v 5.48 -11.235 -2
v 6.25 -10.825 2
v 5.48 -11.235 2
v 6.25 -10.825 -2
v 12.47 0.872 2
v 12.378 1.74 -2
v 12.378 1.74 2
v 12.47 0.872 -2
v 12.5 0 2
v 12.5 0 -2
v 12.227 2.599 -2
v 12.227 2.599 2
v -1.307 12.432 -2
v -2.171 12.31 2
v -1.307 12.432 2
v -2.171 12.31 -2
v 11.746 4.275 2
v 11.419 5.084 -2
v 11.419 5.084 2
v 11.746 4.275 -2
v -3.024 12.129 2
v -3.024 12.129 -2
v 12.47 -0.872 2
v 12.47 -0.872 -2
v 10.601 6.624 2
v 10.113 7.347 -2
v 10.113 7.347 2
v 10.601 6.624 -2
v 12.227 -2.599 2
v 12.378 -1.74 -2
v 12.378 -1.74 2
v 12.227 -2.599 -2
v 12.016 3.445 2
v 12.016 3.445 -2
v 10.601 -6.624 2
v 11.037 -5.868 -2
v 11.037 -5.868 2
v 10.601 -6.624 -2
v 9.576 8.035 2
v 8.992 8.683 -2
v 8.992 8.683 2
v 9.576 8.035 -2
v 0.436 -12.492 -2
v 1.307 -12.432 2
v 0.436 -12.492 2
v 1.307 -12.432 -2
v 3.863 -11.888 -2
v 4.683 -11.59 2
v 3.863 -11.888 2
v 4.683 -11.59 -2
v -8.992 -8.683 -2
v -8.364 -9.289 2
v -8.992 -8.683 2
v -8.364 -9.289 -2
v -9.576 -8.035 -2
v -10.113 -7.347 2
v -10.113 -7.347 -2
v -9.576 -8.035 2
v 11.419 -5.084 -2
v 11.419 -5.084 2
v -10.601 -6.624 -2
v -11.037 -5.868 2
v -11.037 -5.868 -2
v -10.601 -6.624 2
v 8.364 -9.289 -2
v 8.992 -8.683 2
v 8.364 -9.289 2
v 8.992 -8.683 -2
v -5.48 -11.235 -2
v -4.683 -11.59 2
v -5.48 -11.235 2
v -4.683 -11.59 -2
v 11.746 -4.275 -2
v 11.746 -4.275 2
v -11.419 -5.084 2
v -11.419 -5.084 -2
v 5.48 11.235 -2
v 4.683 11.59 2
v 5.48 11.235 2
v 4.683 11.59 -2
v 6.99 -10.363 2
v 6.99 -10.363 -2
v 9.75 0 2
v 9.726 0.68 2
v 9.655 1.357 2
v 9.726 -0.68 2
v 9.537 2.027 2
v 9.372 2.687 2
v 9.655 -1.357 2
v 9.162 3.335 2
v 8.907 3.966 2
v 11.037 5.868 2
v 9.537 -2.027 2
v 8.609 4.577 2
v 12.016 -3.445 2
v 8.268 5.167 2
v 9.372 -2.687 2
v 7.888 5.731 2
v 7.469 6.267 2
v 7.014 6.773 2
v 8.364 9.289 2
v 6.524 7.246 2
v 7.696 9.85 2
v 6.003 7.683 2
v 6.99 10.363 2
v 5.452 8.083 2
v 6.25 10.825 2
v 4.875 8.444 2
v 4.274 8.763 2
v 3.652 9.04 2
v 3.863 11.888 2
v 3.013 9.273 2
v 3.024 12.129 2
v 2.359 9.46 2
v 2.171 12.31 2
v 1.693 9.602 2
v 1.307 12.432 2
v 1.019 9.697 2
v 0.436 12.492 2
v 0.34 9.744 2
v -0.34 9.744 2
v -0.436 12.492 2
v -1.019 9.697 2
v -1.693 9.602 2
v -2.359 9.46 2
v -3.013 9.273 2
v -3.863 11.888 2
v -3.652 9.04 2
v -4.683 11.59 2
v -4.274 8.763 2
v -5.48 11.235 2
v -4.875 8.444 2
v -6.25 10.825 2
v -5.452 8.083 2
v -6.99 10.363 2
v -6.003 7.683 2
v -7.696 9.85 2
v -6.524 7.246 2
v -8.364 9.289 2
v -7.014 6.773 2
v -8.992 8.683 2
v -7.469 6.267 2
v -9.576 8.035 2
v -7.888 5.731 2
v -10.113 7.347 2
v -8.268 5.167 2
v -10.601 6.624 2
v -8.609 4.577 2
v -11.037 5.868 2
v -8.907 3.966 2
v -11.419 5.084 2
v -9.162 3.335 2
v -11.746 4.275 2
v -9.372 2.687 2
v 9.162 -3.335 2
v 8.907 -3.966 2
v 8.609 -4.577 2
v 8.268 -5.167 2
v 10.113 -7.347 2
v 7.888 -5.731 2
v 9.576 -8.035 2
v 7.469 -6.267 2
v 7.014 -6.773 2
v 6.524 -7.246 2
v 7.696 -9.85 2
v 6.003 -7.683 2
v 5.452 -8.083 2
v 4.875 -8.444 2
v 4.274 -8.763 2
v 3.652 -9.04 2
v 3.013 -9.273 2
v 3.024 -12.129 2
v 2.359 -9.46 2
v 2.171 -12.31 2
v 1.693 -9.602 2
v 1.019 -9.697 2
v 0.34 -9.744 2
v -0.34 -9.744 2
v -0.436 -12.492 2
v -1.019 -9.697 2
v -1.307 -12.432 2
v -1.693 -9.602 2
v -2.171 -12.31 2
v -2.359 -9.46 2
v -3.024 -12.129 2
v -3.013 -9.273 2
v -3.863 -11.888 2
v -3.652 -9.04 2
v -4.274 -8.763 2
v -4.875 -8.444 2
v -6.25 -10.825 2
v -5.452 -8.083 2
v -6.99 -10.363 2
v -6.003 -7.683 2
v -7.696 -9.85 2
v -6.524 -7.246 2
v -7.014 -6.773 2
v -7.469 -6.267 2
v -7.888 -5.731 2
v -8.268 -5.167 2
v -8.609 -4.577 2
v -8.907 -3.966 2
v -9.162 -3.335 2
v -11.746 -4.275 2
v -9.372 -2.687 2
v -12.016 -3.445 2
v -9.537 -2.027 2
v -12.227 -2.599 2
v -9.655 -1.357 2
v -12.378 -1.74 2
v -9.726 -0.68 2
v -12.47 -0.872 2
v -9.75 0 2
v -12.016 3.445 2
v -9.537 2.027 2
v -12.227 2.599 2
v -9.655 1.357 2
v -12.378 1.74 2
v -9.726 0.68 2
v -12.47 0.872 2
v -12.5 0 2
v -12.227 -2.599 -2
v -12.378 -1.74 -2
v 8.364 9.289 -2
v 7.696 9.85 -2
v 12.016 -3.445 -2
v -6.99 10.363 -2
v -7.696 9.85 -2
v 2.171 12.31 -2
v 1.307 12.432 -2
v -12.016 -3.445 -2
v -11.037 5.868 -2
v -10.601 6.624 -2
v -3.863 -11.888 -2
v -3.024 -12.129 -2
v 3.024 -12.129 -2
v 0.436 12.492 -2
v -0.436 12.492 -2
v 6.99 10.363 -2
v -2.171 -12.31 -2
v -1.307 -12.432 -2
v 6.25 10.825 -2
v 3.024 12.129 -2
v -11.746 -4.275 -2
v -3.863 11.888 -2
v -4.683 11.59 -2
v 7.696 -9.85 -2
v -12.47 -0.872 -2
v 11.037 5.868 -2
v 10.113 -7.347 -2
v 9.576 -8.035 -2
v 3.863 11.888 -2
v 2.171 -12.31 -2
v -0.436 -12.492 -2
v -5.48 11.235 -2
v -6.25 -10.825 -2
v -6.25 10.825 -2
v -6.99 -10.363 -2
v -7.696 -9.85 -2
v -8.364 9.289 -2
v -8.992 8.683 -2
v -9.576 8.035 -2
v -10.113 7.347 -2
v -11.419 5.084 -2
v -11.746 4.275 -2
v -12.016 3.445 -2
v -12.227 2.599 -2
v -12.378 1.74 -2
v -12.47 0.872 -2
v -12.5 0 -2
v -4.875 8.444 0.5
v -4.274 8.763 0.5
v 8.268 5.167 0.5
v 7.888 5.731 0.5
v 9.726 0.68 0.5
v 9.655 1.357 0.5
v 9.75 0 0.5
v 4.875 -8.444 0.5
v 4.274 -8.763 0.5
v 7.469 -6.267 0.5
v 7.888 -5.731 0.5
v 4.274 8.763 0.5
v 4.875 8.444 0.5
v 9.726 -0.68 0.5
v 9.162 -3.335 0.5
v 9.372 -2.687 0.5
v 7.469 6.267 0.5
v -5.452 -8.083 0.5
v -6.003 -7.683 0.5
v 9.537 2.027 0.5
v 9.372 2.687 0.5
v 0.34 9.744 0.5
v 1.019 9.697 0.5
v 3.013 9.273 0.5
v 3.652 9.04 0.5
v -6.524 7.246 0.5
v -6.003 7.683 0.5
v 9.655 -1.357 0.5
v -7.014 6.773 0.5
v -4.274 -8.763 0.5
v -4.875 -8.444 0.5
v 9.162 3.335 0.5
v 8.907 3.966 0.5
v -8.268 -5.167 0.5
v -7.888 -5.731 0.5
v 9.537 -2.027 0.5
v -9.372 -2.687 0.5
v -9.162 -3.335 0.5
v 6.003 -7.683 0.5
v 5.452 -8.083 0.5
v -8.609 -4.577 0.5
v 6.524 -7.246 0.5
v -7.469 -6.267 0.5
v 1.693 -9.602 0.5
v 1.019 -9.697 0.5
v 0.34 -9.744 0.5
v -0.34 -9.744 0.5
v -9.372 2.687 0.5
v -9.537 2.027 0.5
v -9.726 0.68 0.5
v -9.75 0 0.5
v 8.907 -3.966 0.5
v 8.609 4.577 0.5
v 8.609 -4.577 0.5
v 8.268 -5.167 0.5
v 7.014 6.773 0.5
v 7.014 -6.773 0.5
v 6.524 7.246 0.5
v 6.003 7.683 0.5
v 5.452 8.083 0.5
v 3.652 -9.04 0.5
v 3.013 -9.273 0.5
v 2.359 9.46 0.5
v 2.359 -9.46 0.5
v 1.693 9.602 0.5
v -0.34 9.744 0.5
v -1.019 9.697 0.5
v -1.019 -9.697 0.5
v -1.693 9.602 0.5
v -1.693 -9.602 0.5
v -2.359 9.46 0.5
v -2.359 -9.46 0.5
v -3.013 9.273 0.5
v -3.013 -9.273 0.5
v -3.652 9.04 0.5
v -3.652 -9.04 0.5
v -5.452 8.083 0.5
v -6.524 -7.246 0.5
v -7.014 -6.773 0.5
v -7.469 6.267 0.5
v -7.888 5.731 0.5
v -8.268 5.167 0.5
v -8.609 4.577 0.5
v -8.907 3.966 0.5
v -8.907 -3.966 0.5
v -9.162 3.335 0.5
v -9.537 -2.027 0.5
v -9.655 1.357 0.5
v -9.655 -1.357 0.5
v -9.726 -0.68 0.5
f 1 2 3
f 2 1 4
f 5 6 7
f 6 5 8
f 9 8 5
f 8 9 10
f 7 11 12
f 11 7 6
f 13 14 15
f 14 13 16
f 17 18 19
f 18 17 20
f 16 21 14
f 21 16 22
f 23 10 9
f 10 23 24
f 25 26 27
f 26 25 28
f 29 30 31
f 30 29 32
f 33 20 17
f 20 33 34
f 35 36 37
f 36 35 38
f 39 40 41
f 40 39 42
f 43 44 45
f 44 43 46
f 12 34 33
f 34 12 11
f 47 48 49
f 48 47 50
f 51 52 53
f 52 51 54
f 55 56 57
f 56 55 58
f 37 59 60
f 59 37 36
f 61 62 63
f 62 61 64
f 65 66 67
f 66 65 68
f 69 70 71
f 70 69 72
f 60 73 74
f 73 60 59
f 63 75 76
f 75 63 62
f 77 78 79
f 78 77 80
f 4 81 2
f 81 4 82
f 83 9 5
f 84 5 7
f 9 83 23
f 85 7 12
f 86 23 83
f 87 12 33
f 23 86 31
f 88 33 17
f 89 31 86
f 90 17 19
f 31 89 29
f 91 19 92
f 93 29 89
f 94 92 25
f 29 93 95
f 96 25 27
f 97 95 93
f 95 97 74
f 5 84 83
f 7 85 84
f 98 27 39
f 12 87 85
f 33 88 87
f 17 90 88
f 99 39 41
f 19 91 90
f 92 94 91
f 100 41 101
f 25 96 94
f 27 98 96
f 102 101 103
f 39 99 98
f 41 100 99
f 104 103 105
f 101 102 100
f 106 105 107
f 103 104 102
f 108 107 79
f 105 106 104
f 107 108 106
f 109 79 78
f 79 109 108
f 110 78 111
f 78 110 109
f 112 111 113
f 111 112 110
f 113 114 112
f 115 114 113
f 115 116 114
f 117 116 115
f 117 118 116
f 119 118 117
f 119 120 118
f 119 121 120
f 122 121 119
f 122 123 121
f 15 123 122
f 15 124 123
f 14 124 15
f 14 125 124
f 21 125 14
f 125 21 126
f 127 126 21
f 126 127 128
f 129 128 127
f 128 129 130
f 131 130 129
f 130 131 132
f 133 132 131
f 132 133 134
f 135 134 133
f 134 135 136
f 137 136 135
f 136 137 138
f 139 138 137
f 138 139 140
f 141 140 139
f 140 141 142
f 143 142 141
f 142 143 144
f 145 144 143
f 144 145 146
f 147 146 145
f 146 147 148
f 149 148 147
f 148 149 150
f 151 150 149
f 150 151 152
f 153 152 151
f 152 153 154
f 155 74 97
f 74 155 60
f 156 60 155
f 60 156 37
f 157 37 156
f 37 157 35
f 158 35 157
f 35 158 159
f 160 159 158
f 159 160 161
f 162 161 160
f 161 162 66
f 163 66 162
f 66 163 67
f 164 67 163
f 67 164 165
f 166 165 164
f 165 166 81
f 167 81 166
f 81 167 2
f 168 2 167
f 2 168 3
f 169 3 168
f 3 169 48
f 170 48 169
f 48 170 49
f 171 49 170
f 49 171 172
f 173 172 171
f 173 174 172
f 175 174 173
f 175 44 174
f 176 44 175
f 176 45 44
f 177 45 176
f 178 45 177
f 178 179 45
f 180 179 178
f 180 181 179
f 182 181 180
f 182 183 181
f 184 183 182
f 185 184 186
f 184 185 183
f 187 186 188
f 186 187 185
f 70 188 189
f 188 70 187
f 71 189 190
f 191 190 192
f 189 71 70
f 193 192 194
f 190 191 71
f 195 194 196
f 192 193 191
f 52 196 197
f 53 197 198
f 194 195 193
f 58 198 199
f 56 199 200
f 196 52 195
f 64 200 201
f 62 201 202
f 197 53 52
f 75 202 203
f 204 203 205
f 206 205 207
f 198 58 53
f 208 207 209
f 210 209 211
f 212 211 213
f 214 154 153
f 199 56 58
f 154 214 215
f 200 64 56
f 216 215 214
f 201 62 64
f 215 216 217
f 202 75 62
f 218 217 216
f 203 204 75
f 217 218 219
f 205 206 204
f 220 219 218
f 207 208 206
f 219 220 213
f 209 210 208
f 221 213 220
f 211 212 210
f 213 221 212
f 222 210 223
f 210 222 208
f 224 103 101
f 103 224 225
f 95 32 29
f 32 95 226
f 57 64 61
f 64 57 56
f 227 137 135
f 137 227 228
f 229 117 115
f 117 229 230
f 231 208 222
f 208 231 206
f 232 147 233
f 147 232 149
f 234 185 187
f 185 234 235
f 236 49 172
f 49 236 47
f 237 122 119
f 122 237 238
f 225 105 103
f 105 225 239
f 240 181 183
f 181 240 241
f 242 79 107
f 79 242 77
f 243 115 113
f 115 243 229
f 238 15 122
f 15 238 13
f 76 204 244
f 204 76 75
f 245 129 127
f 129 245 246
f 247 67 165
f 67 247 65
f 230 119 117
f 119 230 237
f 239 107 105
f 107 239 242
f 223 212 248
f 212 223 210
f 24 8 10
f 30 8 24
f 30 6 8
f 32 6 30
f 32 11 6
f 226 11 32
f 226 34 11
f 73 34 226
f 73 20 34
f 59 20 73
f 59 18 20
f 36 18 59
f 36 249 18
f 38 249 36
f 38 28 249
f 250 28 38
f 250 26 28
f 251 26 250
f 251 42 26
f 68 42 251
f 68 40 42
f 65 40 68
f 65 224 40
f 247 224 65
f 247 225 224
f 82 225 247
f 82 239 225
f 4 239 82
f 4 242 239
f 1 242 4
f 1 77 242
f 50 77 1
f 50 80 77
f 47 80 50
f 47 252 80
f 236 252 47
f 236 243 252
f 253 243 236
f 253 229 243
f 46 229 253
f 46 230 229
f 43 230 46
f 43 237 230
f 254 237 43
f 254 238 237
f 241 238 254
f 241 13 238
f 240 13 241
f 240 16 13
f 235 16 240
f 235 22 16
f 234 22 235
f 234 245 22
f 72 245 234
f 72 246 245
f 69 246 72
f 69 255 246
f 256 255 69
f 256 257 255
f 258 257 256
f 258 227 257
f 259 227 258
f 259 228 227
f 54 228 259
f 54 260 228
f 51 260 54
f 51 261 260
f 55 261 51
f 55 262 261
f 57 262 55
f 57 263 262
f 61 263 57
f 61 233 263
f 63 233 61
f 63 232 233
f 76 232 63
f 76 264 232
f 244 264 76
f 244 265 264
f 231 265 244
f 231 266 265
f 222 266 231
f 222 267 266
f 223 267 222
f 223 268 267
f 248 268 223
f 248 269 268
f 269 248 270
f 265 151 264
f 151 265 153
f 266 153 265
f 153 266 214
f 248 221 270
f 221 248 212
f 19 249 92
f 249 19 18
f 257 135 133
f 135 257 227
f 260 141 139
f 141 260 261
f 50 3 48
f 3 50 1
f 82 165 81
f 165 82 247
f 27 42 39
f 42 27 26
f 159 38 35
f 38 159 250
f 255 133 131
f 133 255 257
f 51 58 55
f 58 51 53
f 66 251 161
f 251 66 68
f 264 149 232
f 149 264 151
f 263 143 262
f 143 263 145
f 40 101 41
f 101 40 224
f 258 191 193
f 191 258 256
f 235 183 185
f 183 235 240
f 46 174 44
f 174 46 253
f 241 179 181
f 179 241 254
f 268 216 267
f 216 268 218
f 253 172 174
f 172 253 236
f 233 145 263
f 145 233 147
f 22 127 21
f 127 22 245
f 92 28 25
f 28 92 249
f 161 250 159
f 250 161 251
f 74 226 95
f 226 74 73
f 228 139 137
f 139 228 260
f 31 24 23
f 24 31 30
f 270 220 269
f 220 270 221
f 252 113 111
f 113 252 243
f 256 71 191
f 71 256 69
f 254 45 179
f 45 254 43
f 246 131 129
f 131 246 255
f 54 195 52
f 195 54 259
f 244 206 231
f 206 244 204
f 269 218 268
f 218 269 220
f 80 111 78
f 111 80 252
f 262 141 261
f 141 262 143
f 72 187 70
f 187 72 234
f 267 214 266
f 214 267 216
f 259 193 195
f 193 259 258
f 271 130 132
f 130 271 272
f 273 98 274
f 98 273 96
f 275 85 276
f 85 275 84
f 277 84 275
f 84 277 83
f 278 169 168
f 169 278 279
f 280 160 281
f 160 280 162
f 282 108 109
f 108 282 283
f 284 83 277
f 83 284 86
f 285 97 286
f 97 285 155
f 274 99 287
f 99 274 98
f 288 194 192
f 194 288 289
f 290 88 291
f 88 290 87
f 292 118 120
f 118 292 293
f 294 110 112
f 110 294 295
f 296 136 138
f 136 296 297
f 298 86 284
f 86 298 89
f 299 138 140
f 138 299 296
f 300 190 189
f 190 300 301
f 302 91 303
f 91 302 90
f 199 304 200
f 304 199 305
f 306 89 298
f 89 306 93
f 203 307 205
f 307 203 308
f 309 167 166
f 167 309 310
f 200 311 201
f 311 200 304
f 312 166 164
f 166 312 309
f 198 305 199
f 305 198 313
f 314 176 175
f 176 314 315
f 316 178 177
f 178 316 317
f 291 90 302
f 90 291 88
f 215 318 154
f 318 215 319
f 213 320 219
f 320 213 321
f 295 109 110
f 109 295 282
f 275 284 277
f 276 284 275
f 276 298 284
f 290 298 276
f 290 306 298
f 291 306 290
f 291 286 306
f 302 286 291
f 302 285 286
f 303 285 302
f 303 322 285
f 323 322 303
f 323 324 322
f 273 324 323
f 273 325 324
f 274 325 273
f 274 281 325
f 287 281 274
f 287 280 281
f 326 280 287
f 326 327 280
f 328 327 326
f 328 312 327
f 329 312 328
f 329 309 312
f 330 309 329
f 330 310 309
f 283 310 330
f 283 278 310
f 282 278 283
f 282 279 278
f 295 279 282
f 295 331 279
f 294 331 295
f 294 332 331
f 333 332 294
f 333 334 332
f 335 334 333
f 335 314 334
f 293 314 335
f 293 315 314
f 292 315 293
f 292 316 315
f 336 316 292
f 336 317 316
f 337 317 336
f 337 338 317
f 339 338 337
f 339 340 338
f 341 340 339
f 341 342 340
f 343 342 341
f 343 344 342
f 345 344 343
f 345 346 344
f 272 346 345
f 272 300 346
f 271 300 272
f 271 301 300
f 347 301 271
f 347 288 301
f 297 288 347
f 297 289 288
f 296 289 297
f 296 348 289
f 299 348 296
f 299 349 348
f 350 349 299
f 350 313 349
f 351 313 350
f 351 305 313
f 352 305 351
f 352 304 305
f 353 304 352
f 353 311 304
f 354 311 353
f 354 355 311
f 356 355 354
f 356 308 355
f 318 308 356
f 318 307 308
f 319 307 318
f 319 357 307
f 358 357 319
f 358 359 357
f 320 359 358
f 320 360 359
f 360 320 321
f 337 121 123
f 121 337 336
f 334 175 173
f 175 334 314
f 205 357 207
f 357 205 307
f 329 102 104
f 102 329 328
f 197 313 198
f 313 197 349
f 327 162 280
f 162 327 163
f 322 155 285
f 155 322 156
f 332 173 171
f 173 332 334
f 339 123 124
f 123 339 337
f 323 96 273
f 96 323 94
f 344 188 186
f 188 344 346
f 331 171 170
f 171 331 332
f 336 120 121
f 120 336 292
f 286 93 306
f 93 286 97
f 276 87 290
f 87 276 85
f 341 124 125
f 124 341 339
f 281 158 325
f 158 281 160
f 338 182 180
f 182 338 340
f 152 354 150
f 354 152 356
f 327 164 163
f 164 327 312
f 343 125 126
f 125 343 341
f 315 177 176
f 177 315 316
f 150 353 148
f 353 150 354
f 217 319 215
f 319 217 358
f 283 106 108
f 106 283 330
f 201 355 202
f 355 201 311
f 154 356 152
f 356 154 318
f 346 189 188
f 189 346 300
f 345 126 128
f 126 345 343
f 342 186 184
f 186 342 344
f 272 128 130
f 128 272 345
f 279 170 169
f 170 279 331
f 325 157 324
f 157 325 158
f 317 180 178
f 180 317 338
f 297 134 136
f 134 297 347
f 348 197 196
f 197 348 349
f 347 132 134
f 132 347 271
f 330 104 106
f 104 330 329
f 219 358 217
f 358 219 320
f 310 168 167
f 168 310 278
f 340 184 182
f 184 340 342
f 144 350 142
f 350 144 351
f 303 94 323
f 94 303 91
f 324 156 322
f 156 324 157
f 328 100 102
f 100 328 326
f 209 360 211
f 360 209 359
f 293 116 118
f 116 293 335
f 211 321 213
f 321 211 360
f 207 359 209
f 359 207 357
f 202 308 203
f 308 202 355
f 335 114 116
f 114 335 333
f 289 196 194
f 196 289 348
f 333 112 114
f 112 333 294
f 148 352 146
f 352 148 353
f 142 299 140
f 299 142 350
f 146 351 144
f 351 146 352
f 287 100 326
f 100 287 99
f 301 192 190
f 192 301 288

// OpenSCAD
$fa=4; // default minimum facet angle is now 4
$fs=0.05; // default minimum facet size is now 0.05 mm

difference() {
  cylinder(r=12.5, h=4, center=true);
  translate([0, 0, 2]) cylinder(r=9.75, h=3, center=true);
}
